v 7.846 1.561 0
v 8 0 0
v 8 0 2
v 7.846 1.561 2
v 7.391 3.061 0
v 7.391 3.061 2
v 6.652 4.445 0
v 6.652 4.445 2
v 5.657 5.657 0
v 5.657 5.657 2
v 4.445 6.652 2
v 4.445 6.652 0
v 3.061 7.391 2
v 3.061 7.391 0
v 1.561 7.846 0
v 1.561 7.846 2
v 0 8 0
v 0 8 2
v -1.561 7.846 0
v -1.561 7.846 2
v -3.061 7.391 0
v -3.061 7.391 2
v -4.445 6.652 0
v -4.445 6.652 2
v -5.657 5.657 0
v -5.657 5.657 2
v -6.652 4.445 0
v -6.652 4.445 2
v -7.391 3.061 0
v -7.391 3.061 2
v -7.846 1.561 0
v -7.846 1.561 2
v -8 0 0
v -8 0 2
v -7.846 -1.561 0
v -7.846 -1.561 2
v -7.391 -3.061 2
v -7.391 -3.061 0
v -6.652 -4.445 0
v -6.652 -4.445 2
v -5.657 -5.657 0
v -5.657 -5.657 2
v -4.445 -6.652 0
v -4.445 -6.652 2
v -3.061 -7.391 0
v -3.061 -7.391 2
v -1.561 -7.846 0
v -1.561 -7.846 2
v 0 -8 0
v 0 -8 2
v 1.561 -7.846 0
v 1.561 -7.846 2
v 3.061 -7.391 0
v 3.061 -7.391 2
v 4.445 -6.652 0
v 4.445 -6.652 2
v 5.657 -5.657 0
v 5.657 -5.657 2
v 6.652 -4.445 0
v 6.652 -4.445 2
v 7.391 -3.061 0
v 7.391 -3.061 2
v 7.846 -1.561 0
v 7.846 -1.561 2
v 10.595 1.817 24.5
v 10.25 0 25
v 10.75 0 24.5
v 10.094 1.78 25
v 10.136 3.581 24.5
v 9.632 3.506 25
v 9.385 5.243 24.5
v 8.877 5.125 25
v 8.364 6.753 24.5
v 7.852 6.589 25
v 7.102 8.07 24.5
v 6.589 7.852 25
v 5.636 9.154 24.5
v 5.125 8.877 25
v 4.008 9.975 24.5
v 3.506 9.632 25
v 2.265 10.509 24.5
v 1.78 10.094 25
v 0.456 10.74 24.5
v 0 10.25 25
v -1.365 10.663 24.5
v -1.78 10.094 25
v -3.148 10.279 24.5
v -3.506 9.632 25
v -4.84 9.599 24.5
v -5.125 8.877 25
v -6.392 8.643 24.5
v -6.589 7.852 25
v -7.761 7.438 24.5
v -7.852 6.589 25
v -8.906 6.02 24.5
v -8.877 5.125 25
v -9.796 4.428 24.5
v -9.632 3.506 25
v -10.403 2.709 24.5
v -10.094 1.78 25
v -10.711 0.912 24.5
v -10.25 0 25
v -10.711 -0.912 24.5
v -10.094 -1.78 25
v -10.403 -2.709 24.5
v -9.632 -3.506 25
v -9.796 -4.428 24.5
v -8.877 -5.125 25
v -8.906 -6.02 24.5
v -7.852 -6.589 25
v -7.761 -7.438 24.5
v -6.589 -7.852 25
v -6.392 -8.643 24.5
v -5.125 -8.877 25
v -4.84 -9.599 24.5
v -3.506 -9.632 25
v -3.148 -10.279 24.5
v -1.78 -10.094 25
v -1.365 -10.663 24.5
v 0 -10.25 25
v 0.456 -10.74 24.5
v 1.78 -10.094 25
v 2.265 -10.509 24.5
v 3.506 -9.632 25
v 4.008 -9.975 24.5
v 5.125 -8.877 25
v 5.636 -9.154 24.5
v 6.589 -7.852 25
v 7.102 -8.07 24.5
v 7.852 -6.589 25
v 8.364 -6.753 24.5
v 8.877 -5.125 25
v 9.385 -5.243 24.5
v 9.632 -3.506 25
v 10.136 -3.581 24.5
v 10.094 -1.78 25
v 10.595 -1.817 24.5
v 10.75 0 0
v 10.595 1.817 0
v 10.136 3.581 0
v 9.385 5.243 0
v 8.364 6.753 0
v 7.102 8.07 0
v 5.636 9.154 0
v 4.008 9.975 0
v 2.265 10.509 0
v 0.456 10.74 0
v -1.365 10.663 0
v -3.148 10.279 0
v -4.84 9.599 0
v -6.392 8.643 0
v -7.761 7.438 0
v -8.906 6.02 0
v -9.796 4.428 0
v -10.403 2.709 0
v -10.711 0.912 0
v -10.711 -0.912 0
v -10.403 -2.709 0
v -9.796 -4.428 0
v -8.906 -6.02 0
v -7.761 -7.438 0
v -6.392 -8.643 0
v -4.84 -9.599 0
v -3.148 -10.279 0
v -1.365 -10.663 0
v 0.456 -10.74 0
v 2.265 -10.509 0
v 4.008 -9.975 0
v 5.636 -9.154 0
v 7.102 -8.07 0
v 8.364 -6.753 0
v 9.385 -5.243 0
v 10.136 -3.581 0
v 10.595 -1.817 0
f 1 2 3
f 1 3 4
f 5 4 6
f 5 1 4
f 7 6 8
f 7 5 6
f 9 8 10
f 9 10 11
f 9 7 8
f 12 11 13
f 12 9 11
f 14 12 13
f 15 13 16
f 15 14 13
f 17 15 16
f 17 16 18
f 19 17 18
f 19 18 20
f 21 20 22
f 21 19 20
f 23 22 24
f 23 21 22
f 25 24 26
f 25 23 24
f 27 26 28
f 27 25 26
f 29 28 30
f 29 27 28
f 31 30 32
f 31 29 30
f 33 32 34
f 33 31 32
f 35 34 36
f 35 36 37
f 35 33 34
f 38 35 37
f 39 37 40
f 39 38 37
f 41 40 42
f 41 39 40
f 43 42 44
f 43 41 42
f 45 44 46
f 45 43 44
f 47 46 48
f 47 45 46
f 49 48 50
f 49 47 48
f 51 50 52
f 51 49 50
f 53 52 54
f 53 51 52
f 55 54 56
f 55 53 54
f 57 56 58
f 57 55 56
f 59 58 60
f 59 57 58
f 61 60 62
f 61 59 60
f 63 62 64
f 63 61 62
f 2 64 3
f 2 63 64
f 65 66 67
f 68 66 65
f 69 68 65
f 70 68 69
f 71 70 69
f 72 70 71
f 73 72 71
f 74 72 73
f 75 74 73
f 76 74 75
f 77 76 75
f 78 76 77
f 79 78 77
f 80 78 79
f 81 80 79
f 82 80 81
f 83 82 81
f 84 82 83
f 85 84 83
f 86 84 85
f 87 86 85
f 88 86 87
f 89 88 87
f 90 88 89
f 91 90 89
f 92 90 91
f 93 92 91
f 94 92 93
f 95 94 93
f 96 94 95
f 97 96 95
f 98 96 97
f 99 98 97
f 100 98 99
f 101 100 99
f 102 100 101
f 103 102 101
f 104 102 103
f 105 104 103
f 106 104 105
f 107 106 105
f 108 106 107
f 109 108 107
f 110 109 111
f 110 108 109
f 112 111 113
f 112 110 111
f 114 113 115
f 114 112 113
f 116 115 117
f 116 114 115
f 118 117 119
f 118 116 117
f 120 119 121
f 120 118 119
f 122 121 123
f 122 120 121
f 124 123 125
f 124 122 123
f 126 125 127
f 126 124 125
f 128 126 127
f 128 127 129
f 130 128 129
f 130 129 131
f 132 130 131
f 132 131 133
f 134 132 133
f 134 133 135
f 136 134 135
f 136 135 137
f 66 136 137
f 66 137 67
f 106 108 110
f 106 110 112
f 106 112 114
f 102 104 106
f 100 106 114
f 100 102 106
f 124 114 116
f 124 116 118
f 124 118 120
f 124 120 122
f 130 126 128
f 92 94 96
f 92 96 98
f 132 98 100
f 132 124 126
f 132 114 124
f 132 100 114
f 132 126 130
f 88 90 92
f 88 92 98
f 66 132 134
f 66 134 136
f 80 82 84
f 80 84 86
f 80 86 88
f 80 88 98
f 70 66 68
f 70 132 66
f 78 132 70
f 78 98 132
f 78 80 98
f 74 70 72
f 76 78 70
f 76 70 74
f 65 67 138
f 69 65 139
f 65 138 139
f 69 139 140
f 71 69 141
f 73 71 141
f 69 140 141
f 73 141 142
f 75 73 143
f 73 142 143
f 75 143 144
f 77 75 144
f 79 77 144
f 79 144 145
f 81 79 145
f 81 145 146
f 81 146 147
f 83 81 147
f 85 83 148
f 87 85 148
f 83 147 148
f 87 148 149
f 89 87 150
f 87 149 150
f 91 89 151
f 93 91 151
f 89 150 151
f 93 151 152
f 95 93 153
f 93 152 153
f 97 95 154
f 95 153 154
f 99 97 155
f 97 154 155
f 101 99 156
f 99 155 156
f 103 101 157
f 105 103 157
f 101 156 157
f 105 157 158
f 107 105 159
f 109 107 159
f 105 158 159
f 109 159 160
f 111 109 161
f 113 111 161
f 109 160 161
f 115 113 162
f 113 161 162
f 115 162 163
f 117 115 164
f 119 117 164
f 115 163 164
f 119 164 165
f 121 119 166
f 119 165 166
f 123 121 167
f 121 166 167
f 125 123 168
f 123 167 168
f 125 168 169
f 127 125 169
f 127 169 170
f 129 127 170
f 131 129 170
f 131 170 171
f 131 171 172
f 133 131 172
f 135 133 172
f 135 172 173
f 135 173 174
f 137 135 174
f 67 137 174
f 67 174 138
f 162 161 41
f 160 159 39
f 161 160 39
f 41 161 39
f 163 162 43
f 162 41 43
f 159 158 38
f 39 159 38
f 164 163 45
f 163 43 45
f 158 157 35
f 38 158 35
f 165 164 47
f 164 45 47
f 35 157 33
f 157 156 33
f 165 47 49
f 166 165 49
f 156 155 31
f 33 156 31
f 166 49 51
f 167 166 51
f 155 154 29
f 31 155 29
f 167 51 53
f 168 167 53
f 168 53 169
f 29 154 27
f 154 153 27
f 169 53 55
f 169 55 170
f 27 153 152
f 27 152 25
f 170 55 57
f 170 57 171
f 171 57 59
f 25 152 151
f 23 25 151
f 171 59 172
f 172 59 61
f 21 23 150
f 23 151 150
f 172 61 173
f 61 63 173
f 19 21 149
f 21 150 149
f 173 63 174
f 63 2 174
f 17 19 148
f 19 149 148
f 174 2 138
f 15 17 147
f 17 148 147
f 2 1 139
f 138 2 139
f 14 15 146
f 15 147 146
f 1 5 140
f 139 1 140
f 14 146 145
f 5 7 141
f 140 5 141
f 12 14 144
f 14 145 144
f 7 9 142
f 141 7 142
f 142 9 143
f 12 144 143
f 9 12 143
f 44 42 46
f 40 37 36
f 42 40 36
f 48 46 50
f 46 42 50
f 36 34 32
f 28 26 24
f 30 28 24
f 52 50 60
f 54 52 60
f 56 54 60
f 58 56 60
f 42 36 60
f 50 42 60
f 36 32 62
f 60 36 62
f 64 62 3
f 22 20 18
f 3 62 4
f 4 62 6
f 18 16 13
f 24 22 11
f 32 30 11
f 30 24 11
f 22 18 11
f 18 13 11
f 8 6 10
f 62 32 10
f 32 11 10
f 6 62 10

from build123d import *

# Parameters (mm, degrees)
F0_R     = 10.75
F0_R_2   = 8
F1_DEPTH = 25
F2_DEPTH = 2
F3_SIZE  = 0.5


with BuildPart() as f1:
    # F0 (on Top) → F1 (new body)
    with BuildSketch(Plane.XY):
        Circle(F0_R)
        Circle(F0_R_2, mode=Mode.SUBTRACT)
        Circle(F0_R_2)
    extrude(amount=F1_DEPTH)

    # F0 (on Top) → F2 (cut)
    with BuildSketch(Plane.XY):
        Circle(F0_R_2)
    extrude(amount=F2_DEPTH, mode=Mode.SUBTRACT)

    # F3
    f3_edges = [f1.edges().sort_by_distance(p)[0] for p in [
        (-10.75, 0, 25),
    ]]
    chamfer(f3_edges, length=F3_SIZE)


solid = f1.part
